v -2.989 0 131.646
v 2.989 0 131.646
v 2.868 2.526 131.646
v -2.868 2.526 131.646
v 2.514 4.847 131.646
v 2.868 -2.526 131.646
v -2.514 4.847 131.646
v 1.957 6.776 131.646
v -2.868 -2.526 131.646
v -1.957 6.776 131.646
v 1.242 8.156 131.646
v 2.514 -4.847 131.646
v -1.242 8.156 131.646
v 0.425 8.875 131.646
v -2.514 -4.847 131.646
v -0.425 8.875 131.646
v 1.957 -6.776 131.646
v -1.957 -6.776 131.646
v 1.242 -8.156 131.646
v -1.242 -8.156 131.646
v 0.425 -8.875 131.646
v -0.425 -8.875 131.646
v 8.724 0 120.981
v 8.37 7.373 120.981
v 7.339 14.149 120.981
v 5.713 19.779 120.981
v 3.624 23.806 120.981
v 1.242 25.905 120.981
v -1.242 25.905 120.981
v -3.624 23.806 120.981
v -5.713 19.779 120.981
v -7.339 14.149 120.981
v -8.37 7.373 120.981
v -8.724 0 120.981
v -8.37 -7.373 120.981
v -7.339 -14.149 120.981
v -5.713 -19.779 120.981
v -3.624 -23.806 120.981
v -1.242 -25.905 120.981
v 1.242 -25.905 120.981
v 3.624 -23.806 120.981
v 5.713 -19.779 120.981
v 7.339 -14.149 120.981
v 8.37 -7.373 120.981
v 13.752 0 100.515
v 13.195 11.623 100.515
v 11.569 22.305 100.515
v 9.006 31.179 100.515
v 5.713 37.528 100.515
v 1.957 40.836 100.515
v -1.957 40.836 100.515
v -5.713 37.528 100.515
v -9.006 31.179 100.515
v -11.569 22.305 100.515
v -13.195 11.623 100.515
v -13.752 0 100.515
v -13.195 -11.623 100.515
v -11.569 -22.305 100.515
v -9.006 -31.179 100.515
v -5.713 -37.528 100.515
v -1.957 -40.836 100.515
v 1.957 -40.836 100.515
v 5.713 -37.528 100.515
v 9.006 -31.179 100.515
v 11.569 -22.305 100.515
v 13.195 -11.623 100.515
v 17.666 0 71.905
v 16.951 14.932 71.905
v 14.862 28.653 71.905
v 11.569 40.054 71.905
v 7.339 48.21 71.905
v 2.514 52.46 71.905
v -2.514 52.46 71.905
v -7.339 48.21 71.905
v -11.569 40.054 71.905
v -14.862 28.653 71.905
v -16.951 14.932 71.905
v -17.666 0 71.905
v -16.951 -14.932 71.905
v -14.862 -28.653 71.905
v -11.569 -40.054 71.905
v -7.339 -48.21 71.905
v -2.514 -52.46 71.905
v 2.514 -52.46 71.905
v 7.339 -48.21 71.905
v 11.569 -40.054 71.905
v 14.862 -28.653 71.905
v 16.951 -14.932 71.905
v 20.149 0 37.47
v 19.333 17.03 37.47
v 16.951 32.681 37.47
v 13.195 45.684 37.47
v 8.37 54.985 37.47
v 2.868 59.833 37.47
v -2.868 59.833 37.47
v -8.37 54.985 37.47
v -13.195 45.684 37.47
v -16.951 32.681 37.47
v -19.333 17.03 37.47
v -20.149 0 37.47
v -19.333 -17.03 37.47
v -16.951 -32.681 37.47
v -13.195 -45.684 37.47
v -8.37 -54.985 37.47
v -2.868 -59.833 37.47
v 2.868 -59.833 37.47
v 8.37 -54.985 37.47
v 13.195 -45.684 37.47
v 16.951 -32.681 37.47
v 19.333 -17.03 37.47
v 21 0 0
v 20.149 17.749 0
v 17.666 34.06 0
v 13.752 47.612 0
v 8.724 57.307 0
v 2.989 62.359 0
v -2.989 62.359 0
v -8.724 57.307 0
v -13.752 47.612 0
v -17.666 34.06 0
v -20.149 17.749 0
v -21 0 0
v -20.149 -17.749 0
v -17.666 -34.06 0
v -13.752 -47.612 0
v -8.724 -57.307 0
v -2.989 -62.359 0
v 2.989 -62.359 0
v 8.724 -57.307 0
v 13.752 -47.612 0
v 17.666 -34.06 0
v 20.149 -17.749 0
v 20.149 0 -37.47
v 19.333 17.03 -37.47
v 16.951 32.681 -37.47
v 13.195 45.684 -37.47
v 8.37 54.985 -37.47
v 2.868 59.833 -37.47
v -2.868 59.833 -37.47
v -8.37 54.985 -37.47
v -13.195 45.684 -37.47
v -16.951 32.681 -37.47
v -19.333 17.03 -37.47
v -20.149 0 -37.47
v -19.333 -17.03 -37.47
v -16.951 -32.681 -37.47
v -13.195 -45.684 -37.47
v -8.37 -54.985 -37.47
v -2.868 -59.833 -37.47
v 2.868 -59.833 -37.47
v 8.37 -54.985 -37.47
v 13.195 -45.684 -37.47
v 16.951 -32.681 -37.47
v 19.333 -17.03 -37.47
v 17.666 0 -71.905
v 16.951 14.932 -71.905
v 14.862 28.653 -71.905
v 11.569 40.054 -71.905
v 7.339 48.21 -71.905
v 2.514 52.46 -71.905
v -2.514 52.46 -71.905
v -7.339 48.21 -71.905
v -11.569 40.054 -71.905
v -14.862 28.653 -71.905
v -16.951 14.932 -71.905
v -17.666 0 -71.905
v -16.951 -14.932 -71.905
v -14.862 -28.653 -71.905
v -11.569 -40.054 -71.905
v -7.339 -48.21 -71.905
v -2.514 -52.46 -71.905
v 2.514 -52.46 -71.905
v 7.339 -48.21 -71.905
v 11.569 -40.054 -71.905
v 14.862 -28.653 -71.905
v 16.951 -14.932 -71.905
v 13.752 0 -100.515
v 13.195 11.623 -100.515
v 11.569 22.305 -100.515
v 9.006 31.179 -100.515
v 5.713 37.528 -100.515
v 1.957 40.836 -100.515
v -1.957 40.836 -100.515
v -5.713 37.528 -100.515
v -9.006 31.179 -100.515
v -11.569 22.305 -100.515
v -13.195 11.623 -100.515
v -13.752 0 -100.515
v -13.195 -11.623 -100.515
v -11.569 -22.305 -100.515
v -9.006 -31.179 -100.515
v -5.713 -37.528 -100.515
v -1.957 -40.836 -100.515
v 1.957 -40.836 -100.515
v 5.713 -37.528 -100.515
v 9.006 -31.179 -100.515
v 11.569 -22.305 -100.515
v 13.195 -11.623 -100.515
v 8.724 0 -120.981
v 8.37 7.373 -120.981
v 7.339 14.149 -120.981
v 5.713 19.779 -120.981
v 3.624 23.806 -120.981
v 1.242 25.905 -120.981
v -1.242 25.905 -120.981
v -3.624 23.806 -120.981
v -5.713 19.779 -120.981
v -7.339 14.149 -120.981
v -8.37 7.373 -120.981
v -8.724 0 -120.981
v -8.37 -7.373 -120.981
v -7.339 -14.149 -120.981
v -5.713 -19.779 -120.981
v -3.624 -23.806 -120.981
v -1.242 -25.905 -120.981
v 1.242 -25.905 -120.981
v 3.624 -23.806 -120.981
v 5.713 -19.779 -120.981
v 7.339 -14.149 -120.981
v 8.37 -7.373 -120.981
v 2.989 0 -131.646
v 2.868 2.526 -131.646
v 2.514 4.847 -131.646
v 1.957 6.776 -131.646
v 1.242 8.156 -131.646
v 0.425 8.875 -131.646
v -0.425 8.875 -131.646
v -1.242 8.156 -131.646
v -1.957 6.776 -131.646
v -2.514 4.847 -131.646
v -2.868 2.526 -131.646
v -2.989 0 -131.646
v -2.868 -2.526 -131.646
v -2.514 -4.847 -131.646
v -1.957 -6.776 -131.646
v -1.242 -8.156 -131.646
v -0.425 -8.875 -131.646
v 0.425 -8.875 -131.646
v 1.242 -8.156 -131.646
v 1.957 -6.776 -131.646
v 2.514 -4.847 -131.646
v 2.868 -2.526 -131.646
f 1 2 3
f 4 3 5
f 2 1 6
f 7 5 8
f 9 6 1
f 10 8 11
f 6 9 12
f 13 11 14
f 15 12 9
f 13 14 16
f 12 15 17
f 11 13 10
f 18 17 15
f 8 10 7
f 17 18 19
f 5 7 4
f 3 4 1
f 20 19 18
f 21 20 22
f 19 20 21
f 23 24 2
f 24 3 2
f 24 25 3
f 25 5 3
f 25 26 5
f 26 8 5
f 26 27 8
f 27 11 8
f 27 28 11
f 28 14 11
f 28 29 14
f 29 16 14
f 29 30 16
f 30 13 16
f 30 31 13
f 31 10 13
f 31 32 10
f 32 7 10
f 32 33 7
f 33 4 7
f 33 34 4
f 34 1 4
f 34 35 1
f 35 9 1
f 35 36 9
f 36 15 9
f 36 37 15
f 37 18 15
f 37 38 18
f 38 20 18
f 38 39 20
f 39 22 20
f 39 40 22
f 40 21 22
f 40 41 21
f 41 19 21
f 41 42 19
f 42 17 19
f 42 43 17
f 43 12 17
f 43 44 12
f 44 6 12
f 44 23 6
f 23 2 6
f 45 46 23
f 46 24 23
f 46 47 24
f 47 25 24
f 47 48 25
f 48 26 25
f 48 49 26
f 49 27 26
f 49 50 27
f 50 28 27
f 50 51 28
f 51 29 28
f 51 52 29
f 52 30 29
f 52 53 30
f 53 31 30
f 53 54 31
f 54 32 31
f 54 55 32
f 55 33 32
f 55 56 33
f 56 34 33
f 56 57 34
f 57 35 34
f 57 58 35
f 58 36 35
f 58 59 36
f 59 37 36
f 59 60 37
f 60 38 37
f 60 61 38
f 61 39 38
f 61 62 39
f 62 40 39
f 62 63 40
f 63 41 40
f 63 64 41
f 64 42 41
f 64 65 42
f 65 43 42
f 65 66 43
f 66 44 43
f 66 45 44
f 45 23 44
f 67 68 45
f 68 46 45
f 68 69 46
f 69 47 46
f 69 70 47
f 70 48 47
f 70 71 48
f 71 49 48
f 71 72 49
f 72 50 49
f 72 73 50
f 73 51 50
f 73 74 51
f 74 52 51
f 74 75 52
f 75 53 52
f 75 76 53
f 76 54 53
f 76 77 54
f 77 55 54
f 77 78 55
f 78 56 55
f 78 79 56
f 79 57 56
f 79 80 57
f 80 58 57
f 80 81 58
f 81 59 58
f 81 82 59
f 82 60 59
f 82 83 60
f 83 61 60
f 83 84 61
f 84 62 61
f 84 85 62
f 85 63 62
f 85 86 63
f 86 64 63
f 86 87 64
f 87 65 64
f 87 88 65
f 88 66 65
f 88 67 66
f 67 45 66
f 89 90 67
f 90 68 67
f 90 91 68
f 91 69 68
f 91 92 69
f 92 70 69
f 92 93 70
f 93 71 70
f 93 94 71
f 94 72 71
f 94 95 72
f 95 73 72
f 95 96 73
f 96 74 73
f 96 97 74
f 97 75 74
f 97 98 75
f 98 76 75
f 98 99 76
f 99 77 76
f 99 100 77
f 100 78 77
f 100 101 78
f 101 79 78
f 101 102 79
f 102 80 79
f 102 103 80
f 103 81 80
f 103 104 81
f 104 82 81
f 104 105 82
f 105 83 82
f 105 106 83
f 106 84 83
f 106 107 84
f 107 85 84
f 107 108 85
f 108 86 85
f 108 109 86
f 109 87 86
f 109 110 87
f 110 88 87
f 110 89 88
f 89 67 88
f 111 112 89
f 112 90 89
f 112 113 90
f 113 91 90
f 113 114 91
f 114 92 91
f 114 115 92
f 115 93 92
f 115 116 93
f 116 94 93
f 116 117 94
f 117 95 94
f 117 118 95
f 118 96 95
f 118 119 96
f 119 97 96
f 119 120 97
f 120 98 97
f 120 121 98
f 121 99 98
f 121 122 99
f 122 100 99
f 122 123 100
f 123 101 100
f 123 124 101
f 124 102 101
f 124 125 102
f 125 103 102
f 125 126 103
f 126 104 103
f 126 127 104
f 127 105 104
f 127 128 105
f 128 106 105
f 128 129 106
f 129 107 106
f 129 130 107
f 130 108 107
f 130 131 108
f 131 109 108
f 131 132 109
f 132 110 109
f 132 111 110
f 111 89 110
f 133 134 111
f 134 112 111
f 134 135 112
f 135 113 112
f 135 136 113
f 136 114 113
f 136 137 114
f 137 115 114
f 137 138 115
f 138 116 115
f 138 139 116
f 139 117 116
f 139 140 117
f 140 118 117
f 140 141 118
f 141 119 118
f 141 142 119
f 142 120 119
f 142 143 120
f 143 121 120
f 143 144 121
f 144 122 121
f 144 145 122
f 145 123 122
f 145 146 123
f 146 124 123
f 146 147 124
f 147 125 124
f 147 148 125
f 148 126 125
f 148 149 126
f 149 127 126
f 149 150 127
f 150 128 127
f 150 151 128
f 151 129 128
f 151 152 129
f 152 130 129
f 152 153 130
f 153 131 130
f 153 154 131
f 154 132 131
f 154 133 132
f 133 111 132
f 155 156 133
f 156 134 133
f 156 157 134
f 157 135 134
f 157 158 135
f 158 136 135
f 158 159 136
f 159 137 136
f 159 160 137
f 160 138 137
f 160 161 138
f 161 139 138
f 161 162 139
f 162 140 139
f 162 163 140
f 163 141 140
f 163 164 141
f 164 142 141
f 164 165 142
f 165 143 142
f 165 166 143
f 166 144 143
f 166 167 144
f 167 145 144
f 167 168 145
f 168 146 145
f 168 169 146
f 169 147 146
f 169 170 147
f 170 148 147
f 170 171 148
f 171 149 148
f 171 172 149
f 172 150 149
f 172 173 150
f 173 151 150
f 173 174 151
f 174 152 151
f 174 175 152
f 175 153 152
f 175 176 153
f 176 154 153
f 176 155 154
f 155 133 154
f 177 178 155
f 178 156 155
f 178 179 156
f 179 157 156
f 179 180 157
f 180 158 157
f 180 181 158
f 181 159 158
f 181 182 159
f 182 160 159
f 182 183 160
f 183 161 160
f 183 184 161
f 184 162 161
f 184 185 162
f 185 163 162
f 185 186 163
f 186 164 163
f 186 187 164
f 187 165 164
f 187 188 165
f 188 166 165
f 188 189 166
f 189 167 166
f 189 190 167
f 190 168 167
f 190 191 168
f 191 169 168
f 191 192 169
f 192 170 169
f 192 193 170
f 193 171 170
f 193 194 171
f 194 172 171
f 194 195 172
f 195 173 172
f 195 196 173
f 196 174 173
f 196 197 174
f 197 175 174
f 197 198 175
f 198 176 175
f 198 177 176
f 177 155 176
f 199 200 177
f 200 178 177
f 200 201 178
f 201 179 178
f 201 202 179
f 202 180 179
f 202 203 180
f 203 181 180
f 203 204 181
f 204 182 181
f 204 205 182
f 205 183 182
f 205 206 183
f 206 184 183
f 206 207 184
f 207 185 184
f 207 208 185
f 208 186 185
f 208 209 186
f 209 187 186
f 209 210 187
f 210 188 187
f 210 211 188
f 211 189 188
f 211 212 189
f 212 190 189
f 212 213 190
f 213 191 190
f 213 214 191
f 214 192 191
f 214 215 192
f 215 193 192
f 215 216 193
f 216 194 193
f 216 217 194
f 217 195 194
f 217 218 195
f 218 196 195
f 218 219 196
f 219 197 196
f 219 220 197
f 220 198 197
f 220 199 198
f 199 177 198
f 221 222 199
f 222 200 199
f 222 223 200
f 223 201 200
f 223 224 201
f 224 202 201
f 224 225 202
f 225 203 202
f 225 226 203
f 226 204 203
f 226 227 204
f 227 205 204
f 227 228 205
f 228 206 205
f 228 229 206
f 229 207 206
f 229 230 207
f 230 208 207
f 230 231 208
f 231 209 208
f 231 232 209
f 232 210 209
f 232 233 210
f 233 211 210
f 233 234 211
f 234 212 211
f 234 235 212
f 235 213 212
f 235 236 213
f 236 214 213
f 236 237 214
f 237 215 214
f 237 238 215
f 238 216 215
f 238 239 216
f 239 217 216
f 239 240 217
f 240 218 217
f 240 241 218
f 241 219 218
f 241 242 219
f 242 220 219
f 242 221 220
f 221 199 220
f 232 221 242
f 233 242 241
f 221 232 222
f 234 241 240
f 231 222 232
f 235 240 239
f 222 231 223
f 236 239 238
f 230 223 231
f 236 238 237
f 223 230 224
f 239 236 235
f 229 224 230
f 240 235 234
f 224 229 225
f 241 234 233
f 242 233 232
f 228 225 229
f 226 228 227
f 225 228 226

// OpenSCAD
// Generated by SolidPython 1.0.1 on 2020-07-29 00:46:45


scale(v = [3, 9, 19]) {
	sphere(r = 7);
}
/***********************************************
*********      SolidPython code:      **********
************************************************
 
# import packages: SolidPython
from solid import *
from solid.utils import *
from itertools import chain, combinations, permutations


class Resize:

    def __init__(self, scad_file):
        self.scad_file = scad_file
        #self.scad_file = import_scad(scad_file)
        # cone/cylinder param:
        self.r1 = 0
        self.r2 = 0
        self.h = 0
        # rectangular prism param:
        self.w = 0
        self.l = 0
        # ellipse param:
        self.r = 0

    # import OpenScad code (file name corresponds to shape)


    # classify shape + parameters
    def assign(self, param1, param2, param3):
        if self.scad_file == 'cone.scad':
            self.r1 = param1
            self.r2 = param2
            self.h = param3
        elif self.scad_file == 'cylinder.scad':
            self.r1 = param1
            self.r2 = param2
            self.h = param3
        elif self.scad_file == 'rectangularPrism.scad':
            self.h = param1
            self.l = param2
            self.w = param3
        else:
            self.r = param1
            self.h = param2

    # resize parameters
    def iterate(self):
        x = range(3, 20, 2)
        i = 1
        if self.scad_file == 'cone.scad':
            tempList = list(permutations(x, 2))
            for temp in tempList:
                param1 = temp[0]
                param2 = temp[1]
                filepath = 'produced_scad_files/' + 'cone' + str(param1) + '_' + str(param2) + '_' + '.scad'
                scad_render_to_file(cylinder(h=param1, r1=param2, r2=0), filepath)

        elif self.scad_file == 'cylinder.scad':
            tempList = list(permutations(x, 3))
            for temp in tempList:
                param1 = temp[0]
                param2 = temp[1]
                filepath = 'produced_scad_files/' + 'cylinder' + str(param1) + '_' + str(param2) + '_' + '.scad'
                scad_render_to_file(cylinder(h=param1, r1=param2, r2=param2), filepath)

        elif self.scad_file == 'rectangularPrism.scad':
            tempList = list(permutations(x, 3))
            for temp in tempList:
                param1 = temp[0]
                param2 = temp[1]
                param3 = temp[2]
                filepath = 'produced_scad_files/' + 'rectangularPrism' + str(param1) + '_' + str(param2) + '_' + str(
                    param3) + '.scad'
                scad_render_to_file(cube(size=(param1, param2, param3)), filepath)

        elif self.scad_file == 'ellipse.scad':
            tempList = list(permutations(x, 4))
            for temp in tempList:
                param1 = temp[0]
                param2 = temp[1]
                param3 = temp[2]
                param4 = temp[3]
                filepath = 'produced_scad_files/' + 'ellipse' + str(param1) + '_' + str(param2) + '_' + str(param3) + '_' + str(param4) + '.scad'
                scad_render_to_file(scale([param1, param2, param3])(sphere(r=param4)), filepath)

    def render_to_scadfile(self):
        scad_render_to_file(scad, 'example.scad') 
 
************************************************/
